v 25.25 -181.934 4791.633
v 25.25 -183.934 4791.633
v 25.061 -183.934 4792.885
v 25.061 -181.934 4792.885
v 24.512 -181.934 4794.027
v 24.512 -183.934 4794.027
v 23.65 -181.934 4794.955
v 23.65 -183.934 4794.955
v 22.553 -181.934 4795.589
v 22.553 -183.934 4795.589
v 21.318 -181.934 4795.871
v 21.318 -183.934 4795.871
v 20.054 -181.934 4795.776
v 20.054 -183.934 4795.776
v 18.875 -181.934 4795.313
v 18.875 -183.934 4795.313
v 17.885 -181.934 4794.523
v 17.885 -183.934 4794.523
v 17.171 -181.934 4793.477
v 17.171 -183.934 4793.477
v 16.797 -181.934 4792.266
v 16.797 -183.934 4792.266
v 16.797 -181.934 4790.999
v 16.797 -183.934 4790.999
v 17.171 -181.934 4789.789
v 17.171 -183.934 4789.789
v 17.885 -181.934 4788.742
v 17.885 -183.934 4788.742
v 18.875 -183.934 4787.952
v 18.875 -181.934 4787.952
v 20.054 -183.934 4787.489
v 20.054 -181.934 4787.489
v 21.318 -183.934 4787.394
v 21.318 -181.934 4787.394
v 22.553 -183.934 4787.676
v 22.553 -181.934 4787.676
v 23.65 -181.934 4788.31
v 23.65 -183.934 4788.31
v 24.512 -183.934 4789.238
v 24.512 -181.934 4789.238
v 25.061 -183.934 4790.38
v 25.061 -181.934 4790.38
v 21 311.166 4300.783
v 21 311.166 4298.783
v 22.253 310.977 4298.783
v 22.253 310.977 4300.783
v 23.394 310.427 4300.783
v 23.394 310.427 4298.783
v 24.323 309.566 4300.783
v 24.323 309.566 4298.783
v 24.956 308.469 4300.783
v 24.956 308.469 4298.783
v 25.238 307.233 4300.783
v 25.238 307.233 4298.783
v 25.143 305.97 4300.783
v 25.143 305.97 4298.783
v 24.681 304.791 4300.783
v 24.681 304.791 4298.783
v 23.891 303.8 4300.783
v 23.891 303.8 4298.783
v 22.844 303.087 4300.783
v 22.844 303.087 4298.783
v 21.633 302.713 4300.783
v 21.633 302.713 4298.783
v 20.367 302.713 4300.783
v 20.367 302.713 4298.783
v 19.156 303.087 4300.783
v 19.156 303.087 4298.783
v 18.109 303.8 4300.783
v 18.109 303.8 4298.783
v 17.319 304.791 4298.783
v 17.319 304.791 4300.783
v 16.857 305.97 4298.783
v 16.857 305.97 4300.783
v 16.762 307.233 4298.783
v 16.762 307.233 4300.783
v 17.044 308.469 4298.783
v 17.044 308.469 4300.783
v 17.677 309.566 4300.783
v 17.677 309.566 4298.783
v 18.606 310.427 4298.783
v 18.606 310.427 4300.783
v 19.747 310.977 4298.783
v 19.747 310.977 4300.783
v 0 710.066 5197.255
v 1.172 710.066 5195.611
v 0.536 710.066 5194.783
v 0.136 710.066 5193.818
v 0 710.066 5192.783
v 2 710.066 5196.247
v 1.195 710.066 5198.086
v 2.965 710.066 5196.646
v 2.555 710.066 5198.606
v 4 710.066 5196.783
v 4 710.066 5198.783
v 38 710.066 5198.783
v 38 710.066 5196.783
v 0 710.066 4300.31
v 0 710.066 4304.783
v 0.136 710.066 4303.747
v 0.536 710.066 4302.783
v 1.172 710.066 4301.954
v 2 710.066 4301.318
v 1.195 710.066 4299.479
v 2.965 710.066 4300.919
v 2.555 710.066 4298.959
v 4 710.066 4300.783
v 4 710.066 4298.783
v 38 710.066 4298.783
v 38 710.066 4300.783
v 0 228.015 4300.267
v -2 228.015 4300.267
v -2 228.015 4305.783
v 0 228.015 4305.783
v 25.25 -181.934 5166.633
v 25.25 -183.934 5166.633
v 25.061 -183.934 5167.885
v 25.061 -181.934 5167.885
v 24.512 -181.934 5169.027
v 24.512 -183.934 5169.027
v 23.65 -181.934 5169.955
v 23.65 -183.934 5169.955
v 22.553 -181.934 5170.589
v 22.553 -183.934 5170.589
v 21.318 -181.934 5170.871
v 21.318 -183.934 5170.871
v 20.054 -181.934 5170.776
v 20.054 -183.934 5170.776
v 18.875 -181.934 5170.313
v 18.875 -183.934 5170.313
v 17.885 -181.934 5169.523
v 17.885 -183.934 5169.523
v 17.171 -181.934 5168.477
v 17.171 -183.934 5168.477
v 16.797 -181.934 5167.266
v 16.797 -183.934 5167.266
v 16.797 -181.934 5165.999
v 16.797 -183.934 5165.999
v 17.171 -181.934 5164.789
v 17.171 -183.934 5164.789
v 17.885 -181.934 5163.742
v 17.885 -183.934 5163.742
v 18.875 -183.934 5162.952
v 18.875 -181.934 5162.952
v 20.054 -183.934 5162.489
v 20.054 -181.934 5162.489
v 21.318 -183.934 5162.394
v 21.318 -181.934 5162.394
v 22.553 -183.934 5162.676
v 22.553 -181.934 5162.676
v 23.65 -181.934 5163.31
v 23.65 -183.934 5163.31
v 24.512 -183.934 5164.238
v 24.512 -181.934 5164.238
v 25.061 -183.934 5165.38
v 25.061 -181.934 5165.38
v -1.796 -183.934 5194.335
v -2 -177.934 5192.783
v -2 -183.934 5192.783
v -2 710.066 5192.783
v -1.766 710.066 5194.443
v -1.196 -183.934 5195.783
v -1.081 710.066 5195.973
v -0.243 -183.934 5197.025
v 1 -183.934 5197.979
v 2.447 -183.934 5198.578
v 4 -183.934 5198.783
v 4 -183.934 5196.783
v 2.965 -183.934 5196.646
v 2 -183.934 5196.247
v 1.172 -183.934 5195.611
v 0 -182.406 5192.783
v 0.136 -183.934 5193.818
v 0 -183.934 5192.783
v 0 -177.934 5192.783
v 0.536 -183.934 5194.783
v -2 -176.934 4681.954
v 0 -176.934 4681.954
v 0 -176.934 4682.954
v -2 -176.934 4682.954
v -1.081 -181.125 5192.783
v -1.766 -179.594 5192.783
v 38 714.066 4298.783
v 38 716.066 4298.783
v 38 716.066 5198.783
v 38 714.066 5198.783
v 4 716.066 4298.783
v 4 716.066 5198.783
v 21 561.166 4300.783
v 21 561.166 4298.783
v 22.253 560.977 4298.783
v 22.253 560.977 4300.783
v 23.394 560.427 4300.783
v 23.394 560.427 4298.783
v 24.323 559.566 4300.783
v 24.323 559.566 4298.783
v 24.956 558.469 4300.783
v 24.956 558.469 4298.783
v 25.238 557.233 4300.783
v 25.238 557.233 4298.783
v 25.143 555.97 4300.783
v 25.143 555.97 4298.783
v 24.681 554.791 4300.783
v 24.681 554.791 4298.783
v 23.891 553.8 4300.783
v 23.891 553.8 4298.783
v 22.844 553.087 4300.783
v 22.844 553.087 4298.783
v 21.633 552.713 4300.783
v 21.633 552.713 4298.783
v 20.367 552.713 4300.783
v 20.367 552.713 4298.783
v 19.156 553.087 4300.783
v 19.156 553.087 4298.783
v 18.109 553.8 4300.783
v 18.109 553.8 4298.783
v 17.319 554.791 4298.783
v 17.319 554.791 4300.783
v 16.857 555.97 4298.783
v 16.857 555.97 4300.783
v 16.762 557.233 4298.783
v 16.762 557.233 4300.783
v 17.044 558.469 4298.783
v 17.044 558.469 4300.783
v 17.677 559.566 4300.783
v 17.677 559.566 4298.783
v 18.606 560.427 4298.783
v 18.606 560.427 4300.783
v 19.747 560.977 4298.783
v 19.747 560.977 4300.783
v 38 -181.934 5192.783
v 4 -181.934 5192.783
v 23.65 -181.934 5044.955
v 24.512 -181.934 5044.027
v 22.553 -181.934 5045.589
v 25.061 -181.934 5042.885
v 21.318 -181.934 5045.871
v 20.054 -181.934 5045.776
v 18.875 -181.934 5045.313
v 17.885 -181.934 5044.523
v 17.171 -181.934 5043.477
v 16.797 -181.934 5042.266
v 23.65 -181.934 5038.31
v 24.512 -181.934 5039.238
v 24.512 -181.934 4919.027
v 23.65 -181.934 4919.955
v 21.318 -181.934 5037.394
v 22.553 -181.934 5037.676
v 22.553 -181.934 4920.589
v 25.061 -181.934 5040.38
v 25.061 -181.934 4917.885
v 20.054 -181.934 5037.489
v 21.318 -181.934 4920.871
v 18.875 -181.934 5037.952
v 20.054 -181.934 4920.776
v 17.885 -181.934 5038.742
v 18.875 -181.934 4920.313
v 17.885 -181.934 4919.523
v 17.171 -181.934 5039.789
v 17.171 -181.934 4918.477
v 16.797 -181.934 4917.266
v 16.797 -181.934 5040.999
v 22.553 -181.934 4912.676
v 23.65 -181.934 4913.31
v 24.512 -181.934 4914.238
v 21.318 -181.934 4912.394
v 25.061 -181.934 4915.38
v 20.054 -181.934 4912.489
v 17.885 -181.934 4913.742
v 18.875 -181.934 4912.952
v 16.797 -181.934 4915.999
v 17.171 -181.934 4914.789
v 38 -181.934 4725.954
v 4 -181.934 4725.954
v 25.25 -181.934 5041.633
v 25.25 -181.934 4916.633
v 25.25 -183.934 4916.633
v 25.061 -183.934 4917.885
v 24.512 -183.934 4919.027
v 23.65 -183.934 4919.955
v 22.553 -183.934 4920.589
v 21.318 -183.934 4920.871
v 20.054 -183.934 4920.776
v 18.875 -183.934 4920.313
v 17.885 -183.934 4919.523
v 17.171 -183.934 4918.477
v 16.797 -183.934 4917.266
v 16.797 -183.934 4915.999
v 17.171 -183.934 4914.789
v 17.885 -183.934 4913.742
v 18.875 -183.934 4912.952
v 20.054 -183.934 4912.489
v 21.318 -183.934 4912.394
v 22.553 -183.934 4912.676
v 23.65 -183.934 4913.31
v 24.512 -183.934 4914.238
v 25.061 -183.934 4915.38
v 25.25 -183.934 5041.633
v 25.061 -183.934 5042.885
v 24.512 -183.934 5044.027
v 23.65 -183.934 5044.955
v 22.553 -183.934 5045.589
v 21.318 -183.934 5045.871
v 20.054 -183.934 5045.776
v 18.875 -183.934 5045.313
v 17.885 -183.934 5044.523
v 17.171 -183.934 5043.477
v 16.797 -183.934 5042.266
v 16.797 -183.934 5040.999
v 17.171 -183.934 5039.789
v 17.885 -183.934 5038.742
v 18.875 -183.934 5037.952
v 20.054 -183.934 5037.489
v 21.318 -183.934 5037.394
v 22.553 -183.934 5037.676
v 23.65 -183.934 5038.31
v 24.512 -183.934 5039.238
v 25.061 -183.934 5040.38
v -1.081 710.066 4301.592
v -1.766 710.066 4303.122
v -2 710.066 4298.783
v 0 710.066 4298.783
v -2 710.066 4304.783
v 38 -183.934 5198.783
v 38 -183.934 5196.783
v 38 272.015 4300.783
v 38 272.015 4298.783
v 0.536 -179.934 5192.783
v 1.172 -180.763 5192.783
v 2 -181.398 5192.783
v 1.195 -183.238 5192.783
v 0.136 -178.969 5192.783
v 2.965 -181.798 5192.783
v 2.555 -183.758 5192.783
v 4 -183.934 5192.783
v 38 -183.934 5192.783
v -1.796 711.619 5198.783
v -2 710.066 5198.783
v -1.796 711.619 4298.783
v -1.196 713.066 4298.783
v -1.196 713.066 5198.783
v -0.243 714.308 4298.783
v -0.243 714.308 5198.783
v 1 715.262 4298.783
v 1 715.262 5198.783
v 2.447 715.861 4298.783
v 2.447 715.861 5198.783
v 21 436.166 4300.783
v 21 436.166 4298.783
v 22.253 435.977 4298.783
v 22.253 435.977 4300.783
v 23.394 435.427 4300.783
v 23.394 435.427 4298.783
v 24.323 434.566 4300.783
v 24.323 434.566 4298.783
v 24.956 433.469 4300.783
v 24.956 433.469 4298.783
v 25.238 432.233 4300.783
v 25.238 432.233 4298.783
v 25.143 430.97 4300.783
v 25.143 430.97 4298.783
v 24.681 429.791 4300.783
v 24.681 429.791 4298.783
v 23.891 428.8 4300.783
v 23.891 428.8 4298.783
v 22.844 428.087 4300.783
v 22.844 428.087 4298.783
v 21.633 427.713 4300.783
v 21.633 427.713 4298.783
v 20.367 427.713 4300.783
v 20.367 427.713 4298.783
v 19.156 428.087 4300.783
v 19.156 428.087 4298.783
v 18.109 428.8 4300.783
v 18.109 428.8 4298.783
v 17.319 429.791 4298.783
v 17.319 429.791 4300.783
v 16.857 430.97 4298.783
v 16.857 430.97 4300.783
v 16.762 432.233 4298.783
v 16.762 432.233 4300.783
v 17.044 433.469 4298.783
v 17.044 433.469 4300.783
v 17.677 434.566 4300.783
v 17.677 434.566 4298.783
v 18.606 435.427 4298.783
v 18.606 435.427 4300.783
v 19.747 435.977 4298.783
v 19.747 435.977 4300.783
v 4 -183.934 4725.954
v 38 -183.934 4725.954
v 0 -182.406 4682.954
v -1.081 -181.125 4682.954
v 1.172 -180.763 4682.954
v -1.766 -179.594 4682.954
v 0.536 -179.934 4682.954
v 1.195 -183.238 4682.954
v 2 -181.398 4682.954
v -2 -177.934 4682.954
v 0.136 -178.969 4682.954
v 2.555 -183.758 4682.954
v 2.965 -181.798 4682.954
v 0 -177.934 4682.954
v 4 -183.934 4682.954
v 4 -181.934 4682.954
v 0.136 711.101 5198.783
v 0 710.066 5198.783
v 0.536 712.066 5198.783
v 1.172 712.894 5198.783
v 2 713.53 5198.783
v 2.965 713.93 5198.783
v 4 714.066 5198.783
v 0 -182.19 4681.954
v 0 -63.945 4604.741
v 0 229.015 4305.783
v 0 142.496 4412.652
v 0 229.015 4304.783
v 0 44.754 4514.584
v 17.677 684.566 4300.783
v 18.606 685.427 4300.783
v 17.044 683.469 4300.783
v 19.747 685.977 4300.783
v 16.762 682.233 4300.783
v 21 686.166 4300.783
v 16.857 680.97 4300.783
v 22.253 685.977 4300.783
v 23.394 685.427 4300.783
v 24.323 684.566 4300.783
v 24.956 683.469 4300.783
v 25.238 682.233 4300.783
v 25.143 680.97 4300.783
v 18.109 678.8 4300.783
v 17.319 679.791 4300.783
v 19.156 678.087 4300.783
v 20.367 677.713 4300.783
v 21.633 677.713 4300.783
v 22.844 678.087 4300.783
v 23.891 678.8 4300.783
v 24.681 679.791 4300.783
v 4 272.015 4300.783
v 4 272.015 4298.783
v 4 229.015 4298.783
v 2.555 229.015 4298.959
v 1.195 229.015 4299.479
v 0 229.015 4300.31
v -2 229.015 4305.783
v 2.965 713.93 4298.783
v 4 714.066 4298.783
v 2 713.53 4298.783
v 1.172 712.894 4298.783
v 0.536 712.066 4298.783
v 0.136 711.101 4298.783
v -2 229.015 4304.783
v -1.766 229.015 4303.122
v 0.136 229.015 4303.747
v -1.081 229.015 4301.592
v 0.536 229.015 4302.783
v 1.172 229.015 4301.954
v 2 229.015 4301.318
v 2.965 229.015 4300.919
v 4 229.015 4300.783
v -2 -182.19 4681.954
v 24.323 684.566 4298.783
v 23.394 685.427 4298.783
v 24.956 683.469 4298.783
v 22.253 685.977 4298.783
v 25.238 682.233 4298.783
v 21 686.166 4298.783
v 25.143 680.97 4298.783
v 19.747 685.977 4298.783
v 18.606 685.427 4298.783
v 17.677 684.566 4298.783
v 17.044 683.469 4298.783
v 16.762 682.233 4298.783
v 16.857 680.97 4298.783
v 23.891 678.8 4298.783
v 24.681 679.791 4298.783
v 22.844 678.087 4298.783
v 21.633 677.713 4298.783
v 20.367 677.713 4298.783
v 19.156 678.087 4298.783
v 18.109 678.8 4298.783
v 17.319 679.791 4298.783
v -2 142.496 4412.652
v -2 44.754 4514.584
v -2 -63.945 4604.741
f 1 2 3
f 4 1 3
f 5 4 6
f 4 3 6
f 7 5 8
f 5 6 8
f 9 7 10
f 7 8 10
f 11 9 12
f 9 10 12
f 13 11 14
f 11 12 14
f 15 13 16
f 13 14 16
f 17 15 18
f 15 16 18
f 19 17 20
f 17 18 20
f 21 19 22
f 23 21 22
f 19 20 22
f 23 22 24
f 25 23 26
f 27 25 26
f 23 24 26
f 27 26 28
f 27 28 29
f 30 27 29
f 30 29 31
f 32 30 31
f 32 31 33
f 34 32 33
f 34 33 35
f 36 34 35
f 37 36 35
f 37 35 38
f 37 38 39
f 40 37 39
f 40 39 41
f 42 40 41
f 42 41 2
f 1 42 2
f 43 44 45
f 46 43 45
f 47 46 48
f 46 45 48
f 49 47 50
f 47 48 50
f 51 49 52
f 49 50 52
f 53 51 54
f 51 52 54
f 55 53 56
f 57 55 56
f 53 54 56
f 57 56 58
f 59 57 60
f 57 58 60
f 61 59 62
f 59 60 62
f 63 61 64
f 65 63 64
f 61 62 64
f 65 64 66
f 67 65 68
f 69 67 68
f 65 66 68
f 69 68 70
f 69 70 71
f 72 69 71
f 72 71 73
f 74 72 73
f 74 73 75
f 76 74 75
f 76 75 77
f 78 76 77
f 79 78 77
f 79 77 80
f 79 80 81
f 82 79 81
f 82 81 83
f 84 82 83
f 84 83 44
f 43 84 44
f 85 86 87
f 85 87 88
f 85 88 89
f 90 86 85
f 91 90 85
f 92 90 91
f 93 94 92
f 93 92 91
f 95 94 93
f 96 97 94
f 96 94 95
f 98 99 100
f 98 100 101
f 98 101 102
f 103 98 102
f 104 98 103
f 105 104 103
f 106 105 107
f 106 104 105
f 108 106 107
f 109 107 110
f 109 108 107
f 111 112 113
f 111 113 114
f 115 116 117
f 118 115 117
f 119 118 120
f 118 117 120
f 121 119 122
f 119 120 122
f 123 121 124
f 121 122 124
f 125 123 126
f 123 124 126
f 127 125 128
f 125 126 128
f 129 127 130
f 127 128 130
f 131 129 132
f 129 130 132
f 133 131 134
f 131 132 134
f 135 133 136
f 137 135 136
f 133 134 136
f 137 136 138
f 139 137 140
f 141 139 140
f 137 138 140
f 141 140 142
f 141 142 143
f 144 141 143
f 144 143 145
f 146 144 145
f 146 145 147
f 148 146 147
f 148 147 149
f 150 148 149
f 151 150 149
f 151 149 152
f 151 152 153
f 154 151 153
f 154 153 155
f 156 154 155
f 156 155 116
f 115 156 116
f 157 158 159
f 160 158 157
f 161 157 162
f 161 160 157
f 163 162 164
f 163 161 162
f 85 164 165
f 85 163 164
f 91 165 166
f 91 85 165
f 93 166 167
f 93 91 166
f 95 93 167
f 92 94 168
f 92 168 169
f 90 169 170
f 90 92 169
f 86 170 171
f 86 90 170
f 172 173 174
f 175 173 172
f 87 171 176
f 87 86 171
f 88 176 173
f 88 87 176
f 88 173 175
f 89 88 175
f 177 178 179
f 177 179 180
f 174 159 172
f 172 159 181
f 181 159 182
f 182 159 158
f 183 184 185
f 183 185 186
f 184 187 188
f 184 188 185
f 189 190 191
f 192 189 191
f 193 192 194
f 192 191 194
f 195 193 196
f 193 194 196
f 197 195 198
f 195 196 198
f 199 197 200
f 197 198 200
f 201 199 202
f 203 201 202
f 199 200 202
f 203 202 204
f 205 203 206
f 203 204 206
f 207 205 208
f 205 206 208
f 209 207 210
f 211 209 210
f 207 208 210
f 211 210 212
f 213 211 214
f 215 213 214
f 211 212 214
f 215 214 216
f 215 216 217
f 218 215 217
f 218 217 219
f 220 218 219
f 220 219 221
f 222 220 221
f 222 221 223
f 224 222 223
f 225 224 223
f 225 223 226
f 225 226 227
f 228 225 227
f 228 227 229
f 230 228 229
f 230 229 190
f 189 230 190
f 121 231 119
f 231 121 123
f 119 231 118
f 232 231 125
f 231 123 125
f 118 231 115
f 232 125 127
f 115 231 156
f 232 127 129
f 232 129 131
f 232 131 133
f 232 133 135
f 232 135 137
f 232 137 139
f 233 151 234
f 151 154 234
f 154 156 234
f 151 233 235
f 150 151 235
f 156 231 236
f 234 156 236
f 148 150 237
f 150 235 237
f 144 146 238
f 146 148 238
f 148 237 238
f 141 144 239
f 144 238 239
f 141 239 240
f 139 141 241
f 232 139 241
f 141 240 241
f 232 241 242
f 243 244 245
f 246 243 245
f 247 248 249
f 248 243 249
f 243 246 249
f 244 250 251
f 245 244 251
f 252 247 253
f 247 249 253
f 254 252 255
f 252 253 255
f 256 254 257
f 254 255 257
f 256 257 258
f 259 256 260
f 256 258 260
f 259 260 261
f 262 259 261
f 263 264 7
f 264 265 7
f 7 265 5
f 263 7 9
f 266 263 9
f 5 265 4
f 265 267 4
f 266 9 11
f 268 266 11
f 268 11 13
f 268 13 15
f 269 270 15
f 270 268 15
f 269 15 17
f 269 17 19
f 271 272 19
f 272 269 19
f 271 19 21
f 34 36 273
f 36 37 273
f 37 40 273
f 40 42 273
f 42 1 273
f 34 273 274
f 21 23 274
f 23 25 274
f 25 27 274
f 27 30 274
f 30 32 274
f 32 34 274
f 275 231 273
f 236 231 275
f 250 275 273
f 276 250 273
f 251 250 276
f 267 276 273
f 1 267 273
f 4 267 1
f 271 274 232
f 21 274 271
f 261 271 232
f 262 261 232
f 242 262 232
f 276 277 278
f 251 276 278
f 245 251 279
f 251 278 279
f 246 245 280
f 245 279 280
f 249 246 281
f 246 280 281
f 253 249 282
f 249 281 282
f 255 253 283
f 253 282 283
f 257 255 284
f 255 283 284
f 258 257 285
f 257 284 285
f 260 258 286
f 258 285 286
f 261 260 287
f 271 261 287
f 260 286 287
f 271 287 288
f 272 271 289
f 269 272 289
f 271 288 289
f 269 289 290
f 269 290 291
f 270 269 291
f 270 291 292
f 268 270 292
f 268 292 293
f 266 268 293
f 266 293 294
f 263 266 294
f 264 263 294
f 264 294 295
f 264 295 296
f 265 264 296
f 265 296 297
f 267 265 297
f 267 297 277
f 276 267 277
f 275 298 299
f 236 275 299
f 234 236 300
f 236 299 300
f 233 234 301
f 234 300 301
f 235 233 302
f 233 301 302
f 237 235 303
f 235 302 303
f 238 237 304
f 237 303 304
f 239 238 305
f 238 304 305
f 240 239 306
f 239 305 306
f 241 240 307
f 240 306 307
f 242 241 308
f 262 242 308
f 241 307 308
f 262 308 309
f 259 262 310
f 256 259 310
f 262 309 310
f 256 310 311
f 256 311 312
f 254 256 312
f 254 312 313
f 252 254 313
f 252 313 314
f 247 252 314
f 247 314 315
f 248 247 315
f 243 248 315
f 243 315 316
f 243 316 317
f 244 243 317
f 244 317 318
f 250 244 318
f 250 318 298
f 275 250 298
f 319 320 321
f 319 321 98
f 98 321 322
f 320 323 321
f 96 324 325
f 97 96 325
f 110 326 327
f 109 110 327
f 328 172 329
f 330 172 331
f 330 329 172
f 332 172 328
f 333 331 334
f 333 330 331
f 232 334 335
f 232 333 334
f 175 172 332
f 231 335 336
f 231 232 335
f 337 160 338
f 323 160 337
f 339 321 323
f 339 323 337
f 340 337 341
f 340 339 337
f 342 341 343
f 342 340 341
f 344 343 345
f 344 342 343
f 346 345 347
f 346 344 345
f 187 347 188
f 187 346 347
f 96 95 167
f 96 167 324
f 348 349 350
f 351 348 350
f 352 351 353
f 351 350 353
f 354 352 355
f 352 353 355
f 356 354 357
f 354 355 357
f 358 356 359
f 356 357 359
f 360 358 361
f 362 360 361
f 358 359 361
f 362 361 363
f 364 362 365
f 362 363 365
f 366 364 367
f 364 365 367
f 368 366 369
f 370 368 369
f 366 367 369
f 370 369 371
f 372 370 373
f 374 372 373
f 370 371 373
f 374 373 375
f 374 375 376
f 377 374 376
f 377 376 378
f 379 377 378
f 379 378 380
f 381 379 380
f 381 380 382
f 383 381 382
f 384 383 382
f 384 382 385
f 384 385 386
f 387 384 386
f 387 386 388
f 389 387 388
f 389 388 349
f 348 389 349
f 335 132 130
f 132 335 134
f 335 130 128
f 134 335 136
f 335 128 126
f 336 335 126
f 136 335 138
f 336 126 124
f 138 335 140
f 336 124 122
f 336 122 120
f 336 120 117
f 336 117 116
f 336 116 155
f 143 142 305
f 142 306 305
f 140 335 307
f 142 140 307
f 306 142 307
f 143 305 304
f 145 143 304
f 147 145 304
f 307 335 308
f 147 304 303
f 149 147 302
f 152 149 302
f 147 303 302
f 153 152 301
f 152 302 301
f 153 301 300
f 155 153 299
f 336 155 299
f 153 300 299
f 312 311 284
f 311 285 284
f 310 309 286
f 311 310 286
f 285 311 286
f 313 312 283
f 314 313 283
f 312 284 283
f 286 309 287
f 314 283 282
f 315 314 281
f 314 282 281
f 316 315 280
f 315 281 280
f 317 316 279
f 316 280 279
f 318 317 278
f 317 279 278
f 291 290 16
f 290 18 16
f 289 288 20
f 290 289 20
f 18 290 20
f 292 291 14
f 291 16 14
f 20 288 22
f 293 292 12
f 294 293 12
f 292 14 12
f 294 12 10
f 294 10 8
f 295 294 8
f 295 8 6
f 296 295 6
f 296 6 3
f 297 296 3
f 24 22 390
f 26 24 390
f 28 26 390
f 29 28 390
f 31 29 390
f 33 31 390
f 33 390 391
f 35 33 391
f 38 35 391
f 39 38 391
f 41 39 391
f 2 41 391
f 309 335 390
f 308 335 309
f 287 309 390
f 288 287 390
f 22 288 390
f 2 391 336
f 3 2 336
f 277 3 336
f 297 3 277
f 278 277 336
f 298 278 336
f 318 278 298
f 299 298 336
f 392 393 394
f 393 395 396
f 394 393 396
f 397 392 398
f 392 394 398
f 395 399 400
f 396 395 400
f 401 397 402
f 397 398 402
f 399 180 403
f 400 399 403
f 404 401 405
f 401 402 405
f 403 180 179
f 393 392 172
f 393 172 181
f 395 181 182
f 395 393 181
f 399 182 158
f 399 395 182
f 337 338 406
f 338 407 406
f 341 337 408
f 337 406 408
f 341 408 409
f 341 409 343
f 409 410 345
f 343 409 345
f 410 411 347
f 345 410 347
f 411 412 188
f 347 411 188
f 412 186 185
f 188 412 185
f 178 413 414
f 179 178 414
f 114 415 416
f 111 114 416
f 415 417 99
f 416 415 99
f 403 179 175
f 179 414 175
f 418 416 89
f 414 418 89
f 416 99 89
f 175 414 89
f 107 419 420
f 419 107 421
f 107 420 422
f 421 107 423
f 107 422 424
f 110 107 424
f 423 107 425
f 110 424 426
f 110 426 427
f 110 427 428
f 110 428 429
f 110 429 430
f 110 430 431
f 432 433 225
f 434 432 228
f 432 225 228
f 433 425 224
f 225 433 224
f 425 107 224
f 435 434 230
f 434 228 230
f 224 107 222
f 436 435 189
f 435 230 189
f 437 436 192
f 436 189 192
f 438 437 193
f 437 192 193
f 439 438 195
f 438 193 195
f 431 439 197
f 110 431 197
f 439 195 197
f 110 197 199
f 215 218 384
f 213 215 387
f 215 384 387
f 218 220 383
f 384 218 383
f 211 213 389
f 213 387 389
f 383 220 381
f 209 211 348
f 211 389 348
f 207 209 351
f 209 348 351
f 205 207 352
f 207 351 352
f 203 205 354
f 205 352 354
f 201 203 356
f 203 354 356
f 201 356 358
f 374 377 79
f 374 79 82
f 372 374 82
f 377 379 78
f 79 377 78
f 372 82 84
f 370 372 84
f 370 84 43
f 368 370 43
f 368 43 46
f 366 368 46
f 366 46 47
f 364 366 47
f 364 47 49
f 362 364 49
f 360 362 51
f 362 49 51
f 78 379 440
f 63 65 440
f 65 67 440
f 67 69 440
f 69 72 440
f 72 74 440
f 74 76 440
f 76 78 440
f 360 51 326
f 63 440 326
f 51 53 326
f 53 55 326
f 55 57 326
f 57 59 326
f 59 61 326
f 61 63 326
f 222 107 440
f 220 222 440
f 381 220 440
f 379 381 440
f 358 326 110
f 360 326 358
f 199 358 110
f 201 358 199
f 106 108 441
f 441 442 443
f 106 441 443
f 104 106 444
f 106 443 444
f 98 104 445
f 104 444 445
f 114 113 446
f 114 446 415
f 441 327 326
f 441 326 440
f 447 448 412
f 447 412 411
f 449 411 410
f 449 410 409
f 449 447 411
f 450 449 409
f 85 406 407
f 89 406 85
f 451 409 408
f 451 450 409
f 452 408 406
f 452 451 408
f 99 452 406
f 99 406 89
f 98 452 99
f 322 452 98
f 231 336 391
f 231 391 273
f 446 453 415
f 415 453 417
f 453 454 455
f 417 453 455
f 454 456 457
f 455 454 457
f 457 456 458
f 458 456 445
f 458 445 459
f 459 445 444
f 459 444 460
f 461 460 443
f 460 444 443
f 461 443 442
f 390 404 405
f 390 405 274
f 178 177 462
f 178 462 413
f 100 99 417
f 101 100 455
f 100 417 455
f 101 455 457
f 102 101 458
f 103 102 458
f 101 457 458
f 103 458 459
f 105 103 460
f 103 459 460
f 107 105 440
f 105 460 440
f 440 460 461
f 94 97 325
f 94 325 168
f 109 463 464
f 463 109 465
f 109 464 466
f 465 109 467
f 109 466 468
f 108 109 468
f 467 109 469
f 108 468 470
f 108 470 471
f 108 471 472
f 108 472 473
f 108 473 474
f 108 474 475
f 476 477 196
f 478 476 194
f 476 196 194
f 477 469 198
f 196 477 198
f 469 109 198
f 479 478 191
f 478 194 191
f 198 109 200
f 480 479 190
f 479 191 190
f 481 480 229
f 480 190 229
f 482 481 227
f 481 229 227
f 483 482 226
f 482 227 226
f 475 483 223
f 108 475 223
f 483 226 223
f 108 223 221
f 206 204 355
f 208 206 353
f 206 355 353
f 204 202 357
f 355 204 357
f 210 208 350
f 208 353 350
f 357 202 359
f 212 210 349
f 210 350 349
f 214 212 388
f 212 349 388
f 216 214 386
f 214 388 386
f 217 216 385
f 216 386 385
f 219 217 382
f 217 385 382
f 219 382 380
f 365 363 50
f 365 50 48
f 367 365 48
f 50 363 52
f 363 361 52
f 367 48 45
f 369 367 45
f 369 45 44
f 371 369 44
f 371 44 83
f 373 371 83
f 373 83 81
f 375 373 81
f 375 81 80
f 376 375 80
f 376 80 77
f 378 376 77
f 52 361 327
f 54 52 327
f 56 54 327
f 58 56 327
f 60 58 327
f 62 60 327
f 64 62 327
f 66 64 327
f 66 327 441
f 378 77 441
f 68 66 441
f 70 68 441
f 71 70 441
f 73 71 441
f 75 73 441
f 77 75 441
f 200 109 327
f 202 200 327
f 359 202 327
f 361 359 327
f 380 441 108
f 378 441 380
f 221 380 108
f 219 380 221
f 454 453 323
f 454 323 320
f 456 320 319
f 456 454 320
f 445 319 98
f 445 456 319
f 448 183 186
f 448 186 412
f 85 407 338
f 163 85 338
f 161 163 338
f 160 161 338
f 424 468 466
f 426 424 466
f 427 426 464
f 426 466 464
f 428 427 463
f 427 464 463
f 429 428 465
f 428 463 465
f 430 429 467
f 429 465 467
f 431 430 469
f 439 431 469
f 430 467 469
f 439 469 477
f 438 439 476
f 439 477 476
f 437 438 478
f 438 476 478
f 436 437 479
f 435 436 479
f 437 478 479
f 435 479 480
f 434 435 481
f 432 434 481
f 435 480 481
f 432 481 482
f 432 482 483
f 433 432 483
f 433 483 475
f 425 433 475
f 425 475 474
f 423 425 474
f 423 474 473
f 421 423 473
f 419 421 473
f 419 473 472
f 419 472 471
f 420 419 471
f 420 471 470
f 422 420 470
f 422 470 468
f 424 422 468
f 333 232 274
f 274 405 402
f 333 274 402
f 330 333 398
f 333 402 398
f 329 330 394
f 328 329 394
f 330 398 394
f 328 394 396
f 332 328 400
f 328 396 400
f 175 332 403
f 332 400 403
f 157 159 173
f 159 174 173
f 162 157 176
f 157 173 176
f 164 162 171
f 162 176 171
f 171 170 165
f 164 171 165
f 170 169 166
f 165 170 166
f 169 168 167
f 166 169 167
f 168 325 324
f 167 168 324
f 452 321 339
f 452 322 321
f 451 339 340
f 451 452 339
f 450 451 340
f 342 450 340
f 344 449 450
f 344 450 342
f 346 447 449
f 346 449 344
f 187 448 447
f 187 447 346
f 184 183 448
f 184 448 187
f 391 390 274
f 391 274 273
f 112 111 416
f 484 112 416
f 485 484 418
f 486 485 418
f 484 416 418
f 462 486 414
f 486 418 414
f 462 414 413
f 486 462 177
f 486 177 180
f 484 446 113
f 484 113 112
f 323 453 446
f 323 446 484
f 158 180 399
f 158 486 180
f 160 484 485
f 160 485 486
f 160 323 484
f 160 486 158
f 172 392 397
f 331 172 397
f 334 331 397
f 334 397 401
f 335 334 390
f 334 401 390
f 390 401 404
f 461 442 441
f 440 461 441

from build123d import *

# Parameters (mm, degrees)
BASE_FLANGE1_DEPTH           = 2
EDGE_FLANGE1_STRIP_W         = 16
EDGE_FLANGE1_STRIP_H         = 2
EDGE_FLANGE1_STRIP_CUT_DEPTH = 900
EDGE_FLANGE1_DEPTH           = 900
EDGE_FLANGE2_STRIP_W         = 16
EDGE_FLANGE2_STRIP_H         = 2
EDGE_FLANGE2_STRIP_CUT_DEPTH = 894
EDGE_FLANGE2_DEPTH           = 894
EDGE_FLANGE3_START           = 4681.953522875
EDGE_FLANGE3_DEPTH           = 510.829009869
EDGE_FLANGE3_2_DEPTH         = 1
EDGE_FLANGE3_START_2         = 4682.953522875
EDGE_FLANGE3_3_DEPTH         = 509.829009869
EDGE_FLANGE4_START           = 228.014810269
EDGE_FLANGE4_DEPTH           = 482.051021673
EDGE_FLANGE4_2_DEPTH         = 1
EDGE_FLANGE4_START_2         = 229.014810269
EDGE_FLANGE4_3_DEPTH         = 481.051021673
SKETCH18_W                   = 34
SKETCH18_H                   = 43
CUT_EXTRUDE1_DEPTH           = 10
SKETCH19_W                   = 34
SKETCH19_H                   = 43
CUT_EXTRUDE2_DEPTH           = 10
SKETCH20_R                   = 4.25
CUT_EXTRUDE3_DEPTH           = 10
SKETCH21_R                   = 4.25
CUT_EXTRUDE4_DEPTH           = 10


# Read off the part's stored shape, not the designer's step: Edge-Flange3, Edge-Flange4
# Sheet-metal steps are written as plain solids
with BuildPart() as part:
    # Sketch1 → Base-Flange1 (new body)
    with BuildSketch(Plane(origin=(0, 0, 0), x_dir=(0, 0, -1), z_dir=(1, 0, 0))):
        with BuildLine():
            Line((-4682.953522875, -183.934168058), (-5198.782532744, -183.934168058))
            Line((-5198.782532744, -183.934168058), (-5198.782532744, 716.065831942))
            Line((-5198.782532744, 716.065831942), (-4298.782532744, 716.065831942))
            Line((-4298.782532744, 716.065831942), (-4298.782532744, 229.014810269))
            ThreePointArc((-4298.782532744, 229.014810269), (-4514.658558014, 44.672913809), (-4682.953522875, -183.934168058))
        make_face()
    extrude(amount=-BASE_FLANGE1_DEPTH)

    # Edge-Flange1 strip (across the edge) → Edge-Flange1 strip cut (cut)
    with BuildSketch(Plane(origin=(0, 716.065831942, 4298.782532744), x_dir=(0, -1, 0), z_dir=(0, 0, 1))):
        with Locations((-2, -1)):
            Rectangle(EDGE_FLANGE1_STRIP_W, EDGE_FLANGE1_STRIP_H)
    extrude(amount=EDGE_FLANGE1_STRIP_CUT_DEPTH, mode=Mode.SUBTRACT)

    # Edge-Flange1 section (across the edge) → Edge-Flange1 (add)
    with BuildSketch(Plane(origin=(0, 716.065831942, 4298.782532744), x_dir=(0, -1, 0), z_dir=(0, 0, 1))):
        with BuildLine():
            Line((0, 4), (0, 38))
            Line((0, 38), (2, 38))
            Line((2, 38), (2, 4))
            ThreePointArc((2, 4), (3.171572875, 1.171572875), (6, 0))
            Line((6, 0), (6, -2))
            ThreePointArc((6, -2), (1.757359313, -0.242640687), (0, 4))
        make_face()
    extrude(amount=EDGE_FLANGE1_DEPTH)

    # Edge-Flange2 strip (across the edge) → Edge-Flange2 strip cut (cut)
    with BuildSketch(Plane(origin=(0, 710.065831942, 5198.782532744), x_dir=(0, 0, -1), z_dir=(0, -1, 0))):
        with Locations((-2, -1)):
            Rectangle(EDGE_FLANGE2_STRIP_W, EDGE_FLANGE2_STRIP_H)
    extrude(amount=EDGE_FLANGE2_STRIP_CUT_DEPTH, mode=Mode.SUBTRACT)

    # Edge-Flange2 section (across the edge) → Edge-Flange2 (add)
    with BuildSketch(Plane(origin=(0, 710.065831942, 5198.782532744), x_dir=(0, 0, -1), z_dir=(0, -1, 0))):
        with BuildLine():
            Line((0, 4), (0, 38))
            Line((0, 38), (2, 38))
            Line((2, 38), (2, 4))
            ThreePointArc((2, 4), (3.171572875, 1.171572875), (6, 0))
            Line((6, 0), (6, -2))
            ThreePointArc((6, -2), (1.757359313, -0.242640687), (0, 4))
        make_face()
    extrude(amount=EDGE_FLANGE2_DEPTH)

    # Edge-Flange3 outline → Edge-Flange3 (cut)
    with BuildSketch(Plane.XY.offset(EDGE_FLANGE3_START)):
        with BuildLine():
            Line((0, -183.934168058), (0, -182.406304013))
            ThreePointArc((0, -182.406304013), (-1.477225575, -180.383657801), (-2, -177.934168058))
            Line((-2, -177.934168058), (-2, -183.934168058))
            Line((-2, -183.934168058), (0, -183.934168058))
        make_face()
    extrude(amount=EDGE_FLANGE3_DEPTH, mode=Mode.SUBTRACT)

    # Edge-Flange3 2 outline → Edge-Flange3 2 (cut)
    with BuildSketch(Plane.XY.offset(EDGE_FLANGE3_START)):
        with BuildLine():
            Line((0, -182.406304013), (0, -176.934168058))
            Line((0, -176.934168058), (-2, -176.934168058))
            Line((-2, -176.934168058), (-2, -177.934168058))
            ThreePointArc((-2, -177.934168058), (-1.477225575, -180.383657801), (0, -182.406304013))
        make_face()
    extrude(amount=EDGE_FLANGE3_2_DEPTH, mode=Mode.SUBTRACT)

    # Edge-Flange3 3 outline → Edge-Flange3 3 (add)
    with BuildSketch(Plane.XY.offset(EDGE_FLANGE3_START_2)):
        with BuildLine():
            Line((38, -183.934168058), (38, -181.934168058))
            Line((38, -181.934168058), (4, -181.934168058))
            ThreePointArc((4, -181.934168058), (1.171572875, -180.762595183), (0, -177.934168058))
            Line((0, -177.934168058), (0, -182.406304013))
            ThreePointArc((0, -182.406304013), (1.859067461, -183.539202212), (4, -183.934168058))
            Line((4, -183.934168058), (38, -183.934168058))
        make_face()
    extrude(amount=EDGE_FLANGE3_3_DEPTH)

    # Edge-Flange4 outline → Edge-Flange4 (cut)
    with BuildSketch(Plane(origin=(0, 0, 0), x_dir=(1, 0, 0), z_dir=(0, 1, 0)).offset(EDGE_FLANGE4_START)):
        with BuildLine():
            ThreePointArc((-2, -4304.782532744), (-1.477225575, -4302.333043001), (0, -4300.310396789))
            Line((0, -4300.310396789), (0, -4298.782532744))
            Line((0, -4298.782532744), (-2, -4298.782532744))
            Line((-2, -4298.782532744), (-2, -4304.782532744))
        make_face()
    extrude(amount=EDGE_FLANGE4_DEPTH, mode=Mode.SUBTRACT)

    # Edge-Flange4 2 outline → Edge-Flange4 2 (cut)
    with BuildSketch(Plane(origin=(0, 0, 0), x_dir=(1, 0, 0), z_dir=(0, 1, 0)).offset(EDGE_FLANGE4_START)):
        with BuildLine():
            Line((0, -4305.782532744), (0, -4300.310396789))
            ThreePointArc((0, -4300.310396789), (-1.477225575, -4302.333043001), (-2, -4304.782532744))
            Line((-2, -4304.782532744), (-2, -4305.782532744))
            Line((-2, -4305.782532744), (0, -4305.782532744))
        make_face()
    extrude(amount=EDGE_FLANGE4_2_DEPTH, mode=Mode.SUBTRACT)

    # Edge-Flange4 3 outline → Edge-Flange4 3 (add)
    with BuildSketch(Plane(origin=(0, 0, 0), x_dir=(1, 0, 0), z_dir=(0, 1, 0)).offset(EDGE_FLANGE4_START_2)):
        with BuildLine():
            Line((38, -4298.782532744), (4, -4298.782532744))
            ThreePointArc((4, -4298.782532744), (1.859067461, -4299.17749859), (0, -4300.310396789))
            Line((0, -4300.310396789), (0, -4304.782532744))
            ThreePointArc((0, -4304.782532744), (1.171572875, -4301.954105619), (4, -4300.782532744))
            Line((4, -4300.782532744), (38, -4300.782532744))
            Line((38, -4300.782532744), (38, -4298.782532744))
        make_face()
    extrude(amount=EDGE_FLANGE4_3_DEPTH)

    # Sketch18 → Cut-Extrude1 (cut)
    with BuildSketch(Plane.XZ.offset(183.934168058)):
        with Locations((21, 4704.453522875)):
            Rectangle(SKETCH18_W, SKETCH18_H)
    extrude(amount=-CUT_EXTRUDE1_DEPTH, mode=Mode.SUBTRACT)

    # Sketch19 → Cut-Extrude2 (cut)
    with BuildSketch(Plane(origin=(0, 0, 4298.782532744), x_dir=(-1, 0, 0), z_dir=(0, 0, -1))):
        with Locations((-21, 250.514810269)):
            Rectangle(SKETCH19_W, SKETCH19_H)
    extrude(amount=-CUT_EXTRUDE2_DEPTH, mode=Mode.SUBTRACT)

    # Sketch20 → Cut-Extrude3 (cut)
    with BuildSketch(Plane.XZ.offset(183.934168058)):
        with Locations((21, 5166.632532744)):
            Circle(SKETCH20_R)
        with Locations((21, 5041.632532744)):
            Circle(SKETCH20_R)
        with Locations((21, 4916.632532744)):
            Circle(SKETCH20_R)
        with Locations((21, 4791.632532744)):
            Circle(SKETCH20_R)
    extrude(amount=-CUT_EXTRUDE3_DEPTH, mode=Mode.SUBTRACT)

    # Sketch21 → Cut-Extrude4 (cut)
    with BuildSketch(Plane(origin=(0, 0, 4298.782532744), x_dir=(-1, 0, 0), z_dir=(0, 0, -1))):
        with Locations(Location((-21, 681.915831942, 0), (0, 0, 90))):
            Circle(SKETCH21_R)
        with Locations(Location((-21, 556.915831942, 0), (0, 0, 90))):
            Circle(SKETCH21_R)
        with Locations(Location((-21, 431.915831942, 0), (0, 0, 90))):
            Circle(SKETCH21_R)
        with Locations(Location((-21, 306.915831942, 0), (0, 0, 90))):
            Circle(SKETCH21_R)
    extrude(amount=-CUT_EXTRUDE4_DEPTH, mode=Mode.SUBTRACT)


solid = part.part
